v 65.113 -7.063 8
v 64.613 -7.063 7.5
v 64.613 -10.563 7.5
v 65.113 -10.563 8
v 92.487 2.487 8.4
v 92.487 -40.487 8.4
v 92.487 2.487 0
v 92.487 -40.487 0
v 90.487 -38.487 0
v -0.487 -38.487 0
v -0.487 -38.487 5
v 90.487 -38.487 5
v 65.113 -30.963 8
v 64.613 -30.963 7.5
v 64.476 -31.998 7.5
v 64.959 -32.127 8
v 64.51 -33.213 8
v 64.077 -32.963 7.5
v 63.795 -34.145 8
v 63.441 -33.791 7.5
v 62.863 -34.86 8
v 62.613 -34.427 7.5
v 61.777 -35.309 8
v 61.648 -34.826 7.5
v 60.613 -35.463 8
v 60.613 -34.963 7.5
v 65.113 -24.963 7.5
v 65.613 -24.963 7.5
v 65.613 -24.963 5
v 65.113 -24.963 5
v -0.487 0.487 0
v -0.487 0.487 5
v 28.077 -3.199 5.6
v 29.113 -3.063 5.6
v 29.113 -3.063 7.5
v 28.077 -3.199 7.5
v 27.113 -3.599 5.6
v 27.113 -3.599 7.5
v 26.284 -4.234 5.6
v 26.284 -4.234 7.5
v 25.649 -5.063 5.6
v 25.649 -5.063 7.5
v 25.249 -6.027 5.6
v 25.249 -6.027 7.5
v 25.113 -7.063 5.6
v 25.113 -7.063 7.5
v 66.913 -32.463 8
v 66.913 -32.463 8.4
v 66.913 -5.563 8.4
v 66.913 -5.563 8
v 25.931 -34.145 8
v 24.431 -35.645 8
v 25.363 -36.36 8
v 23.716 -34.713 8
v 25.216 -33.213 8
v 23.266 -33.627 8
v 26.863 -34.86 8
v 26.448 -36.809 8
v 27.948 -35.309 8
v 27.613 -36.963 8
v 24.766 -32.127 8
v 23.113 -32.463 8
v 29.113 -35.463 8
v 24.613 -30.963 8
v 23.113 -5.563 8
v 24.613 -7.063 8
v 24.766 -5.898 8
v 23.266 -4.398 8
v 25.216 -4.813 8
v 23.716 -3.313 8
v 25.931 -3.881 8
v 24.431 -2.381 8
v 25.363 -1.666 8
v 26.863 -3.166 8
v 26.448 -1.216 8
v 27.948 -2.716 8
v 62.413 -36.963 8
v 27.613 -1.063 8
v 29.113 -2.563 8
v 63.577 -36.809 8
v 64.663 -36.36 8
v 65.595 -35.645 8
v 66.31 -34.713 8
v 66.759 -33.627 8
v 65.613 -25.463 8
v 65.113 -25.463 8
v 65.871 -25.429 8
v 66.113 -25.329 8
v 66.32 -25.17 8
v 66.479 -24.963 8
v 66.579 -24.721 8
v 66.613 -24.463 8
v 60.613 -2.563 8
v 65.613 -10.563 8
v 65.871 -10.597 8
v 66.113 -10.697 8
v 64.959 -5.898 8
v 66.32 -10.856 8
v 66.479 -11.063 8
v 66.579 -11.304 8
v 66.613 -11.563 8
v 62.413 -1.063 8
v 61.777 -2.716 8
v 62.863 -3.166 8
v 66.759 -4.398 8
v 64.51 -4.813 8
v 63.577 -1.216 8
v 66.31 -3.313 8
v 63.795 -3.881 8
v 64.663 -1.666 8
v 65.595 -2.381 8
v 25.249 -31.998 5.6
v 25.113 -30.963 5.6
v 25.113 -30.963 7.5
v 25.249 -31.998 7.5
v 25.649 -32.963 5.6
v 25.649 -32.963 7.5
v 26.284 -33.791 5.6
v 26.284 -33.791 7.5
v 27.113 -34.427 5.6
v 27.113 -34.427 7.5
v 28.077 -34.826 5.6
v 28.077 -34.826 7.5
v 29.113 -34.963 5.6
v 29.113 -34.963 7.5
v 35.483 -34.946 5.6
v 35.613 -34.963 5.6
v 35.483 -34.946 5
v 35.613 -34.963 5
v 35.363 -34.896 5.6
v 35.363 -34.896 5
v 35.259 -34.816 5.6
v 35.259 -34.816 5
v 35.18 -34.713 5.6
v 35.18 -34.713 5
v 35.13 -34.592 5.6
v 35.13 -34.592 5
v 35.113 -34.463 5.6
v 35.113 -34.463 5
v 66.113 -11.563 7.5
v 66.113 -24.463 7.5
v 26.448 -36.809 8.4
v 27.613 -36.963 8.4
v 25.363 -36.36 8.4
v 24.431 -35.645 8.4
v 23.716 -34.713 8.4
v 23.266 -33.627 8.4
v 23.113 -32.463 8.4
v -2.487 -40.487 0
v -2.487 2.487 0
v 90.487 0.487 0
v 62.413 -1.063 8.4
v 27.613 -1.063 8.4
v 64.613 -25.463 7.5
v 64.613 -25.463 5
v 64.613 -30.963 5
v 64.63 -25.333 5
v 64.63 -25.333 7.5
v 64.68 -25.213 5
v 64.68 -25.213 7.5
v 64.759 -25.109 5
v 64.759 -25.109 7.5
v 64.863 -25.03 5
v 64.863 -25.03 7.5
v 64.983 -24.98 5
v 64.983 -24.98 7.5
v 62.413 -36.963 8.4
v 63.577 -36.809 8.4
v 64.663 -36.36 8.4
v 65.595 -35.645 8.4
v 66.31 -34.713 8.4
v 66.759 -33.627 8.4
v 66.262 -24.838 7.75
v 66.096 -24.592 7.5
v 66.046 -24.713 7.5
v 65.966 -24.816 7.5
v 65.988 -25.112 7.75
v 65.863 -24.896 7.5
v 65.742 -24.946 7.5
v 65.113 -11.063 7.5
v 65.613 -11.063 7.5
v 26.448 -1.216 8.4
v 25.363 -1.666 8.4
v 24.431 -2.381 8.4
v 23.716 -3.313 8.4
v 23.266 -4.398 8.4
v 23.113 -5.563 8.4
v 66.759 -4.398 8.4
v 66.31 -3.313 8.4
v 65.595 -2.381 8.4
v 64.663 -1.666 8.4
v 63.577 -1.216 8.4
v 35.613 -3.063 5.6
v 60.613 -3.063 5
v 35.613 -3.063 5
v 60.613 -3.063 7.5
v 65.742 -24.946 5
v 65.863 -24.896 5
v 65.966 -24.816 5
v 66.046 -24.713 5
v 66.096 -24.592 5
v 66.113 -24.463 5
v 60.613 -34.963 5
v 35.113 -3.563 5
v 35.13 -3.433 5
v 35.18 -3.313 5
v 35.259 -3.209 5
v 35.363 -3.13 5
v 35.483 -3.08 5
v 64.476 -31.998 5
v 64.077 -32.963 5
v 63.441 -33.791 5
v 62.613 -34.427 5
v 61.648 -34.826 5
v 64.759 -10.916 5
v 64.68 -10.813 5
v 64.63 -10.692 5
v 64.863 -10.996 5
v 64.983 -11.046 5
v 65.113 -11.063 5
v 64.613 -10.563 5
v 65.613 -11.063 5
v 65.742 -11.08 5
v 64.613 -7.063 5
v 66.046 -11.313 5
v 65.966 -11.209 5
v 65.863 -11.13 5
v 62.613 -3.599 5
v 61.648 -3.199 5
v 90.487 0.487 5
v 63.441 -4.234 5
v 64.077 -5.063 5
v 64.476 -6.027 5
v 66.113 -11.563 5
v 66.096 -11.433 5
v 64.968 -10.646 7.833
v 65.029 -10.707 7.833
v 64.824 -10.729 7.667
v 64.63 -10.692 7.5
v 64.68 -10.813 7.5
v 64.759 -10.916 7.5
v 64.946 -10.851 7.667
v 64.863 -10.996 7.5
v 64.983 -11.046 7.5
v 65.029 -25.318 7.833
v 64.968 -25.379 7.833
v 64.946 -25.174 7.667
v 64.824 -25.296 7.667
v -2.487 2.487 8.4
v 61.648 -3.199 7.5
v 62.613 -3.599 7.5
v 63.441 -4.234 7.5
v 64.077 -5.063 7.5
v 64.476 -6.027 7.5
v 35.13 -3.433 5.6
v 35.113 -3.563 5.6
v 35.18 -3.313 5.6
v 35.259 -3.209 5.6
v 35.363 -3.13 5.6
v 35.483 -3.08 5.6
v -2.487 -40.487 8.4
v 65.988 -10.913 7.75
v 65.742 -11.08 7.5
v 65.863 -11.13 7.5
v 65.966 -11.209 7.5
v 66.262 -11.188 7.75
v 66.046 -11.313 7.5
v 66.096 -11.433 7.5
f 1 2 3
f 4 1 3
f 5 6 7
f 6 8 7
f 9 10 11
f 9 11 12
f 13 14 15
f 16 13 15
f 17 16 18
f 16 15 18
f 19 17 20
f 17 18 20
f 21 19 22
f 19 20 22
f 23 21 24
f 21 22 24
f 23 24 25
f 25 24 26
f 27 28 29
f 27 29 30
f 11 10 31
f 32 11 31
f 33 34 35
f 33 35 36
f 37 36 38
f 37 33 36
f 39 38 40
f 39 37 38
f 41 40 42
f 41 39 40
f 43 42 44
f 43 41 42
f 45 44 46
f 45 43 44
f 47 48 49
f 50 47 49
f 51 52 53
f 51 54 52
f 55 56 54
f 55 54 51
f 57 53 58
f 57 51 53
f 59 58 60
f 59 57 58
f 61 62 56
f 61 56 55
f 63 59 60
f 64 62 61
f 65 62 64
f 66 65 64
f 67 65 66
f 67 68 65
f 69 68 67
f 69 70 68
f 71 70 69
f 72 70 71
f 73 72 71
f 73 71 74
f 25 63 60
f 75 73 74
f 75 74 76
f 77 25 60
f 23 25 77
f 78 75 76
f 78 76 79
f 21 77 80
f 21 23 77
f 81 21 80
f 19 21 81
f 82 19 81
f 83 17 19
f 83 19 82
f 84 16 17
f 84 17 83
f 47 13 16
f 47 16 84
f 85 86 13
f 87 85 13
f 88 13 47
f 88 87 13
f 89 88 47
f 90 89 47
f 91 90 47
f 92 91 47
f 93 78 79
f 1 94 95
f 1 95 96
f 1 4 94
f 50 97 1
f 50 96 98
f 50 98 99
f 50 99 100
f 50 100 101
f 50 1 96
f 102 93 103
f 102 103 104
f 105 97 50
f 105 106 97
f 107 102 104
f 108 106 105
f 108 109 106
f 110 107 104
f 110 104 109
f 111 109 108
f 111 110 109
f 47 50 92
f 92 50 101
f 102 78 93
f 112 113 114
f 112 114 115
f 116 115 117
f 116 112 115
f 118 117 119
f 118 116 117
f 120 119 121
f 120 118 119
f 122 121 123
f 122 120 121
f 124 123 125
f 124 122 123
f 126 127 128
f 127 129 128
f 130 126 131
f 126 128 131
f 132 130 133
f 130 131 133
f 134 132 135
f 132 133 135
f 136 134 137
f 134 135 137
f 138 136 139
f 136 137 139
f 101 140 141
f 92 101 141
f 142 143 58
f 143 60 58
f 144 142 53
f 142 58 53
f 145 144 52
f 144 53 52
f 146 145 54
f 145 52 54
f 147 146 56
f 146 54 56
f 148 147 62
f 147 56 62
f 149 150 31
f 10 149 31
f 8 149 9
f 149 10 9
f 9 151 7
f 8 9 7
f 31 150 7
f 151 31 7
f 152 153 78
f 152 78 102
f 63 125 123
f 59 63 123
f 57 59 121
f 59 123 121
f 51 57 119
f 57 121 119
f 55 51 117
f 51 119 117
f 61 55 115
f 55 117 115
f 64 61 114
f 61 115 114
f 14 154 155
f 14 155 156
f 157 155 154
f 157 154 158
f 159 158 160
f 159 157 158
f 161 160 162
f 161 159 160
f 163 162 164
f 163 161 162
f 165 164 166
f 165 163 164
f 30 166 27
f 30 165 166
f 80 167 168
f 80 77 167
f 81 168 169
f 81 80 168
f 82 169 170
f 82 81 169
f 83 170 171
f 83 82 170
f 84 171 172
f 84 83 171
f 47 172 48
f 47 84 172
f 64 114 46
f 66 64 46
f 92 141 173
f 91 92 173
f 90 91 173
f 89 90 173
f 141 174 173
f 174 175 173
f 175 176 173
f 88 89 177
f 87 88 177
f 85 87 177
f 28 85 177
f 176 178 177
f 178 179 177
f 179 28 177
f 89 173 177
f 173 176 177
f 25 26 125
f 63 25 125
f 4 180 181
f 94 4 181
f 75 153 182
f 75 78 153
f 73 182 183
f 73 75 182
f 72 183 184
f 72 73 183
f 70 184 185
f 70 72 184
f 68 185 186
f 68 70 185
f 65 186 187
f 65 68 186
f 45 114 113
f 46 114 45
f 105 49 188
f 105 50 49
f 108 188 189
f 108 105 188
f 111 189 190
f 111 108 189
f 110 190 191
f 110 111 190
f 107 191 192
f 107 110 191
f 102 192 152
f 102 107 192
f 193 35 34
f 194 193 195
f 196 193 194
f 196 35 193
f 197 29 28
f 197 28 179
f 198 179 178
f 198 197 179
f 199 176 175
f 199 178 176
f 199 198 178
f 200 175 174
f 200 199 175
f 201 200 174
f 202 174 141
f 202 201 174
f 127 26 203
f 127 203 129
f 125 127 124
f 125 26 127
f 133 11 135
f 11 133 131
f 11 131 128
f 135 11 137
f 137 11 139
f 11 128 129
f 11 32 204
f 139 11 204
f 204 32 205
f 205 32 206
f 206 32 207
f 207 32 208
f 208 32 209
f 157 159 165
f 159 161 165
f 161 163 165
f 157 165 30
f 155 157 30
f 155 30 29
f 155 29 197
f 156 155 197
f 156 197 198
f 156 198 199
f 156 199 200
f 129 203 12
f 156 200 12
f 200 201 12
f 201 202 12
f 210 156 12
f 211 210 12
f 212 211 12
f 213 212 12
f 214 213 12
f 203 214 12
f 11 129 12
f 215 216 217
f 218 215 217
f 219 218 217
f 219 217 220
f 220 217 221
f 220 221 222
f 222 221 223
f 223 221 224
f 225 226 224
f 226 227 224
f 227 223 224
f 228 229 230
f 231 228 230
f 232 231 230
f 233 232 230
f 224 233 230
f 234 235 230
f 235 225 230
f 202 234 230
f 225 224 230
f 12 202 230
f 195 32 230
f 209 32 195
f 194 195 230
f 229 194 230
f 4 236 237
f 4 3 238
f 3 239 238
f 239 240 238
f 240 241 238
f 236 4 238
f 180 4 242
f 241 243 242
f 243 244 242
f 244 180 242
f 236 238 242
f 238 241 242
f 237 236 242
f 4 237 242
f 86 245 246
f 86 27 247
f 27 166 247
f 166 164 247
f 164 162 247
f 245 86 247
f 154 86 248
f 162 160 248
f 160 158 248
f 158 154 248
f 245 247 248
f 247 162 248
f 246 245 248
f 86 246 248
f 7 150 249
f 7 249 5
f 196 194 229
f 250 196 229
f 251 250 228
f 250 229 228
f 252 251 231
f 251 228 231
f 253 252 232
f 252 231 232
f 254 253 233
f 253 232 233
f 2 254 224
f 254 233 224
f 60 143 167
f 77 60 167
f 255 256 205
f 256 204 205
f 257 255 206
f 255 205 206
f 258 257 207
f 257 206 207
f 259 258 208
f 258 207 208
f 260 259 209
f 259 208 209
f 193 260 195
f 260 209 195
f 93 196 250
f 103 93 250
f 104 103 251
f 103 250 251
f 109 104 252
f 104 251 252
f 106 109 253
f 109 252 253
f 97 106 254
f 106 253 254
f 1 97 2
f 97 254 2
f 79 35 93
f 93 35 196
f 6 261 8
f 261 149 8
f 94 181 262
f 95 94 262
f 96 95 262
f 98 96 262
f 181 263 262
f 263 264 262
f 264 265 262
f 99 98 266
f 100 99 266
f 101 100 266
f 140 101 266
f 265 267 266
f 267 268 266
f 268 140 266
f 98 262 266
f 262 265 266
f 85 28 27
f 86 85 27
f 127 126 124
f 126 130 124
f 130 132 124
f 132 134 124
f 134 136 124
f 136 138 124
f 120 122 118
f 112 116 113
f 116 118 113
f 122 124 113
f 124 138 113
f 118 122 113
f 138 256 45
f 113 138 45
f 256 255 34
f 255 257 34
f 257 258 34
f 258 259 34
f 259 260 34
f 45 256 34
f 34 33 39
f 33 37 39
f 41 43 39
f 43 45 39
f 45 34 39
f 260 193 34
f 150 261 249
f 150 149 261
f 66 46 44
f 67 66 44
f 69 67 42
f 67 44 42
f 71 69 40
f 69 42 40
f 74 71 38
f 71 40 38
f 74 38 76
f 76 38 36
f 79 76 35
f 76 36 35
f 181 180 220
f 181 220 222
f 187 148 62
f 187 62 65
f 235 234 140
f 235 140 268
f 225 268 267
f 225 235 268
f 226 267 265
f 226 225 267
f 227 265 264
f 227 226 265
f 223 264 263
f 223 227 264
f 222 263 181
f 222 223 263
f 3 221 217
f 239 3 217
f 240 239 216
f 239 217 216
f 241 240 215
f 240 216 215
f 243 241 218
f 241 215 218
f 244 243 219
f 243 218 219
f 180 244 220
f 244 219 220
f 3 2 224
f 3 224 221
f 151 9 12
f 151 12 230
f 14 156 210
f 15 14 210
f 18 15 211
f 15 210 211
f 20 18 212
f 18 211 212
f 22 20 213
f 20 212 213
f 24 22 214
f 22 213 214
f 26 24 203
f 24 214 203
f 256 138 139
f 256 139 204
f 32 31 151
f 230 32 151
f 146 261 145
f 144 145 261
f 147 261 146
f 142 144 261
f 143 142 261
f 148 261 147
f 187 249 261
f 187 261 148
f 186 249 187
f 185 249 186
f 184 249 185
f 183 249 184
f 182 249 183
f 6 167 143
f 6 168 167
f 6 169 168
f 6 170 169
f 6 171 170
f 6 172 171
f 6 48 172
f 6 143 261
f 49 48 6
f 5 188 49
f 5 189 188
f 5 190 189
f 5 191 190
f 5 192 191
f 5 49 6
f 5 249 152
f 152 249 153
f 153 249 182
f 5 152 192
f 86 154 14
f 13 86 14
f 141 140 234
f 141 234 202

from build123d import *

# Parameters (mm, degrees)
SKETCH_2_W          = 94.97478029
SKETCH_2_H          = 42.97467615
SKETCH_2_W_2        = 90.97478029
SKETCH_2_H_2        = 38.97467615
EXTRUDE_1_DEPTH     = 5
SKETCH_3_W          = 94.97478029
SKETCH_3_H          = 42.97467615
EXTRUDE_2_DEPTH     = 3.4
SKETCH_4_W          = 43.8
SKETCH_4_H          = 35.9
CUT_EXTRUDE_1_DEPTH = 0.4
FILLET_1_R          = 4.5
CUT_EXTRUDE_2_DEPTH = 2.4
CUT_EXTRUDE_3_DEPTH = 0.6
FILLET_2_R          = 4
FILLET_3_R          = 0.5
CHAMFER_1_SIZE      = 0.5


with BuildPart() as part:
    # 草图2 → 凸台-拉伸1 (new body)
    with BuildSketch(Plane.XY):
        with Locations((45.00009017, -19.0000381)):
            Rectangle(SKETCH_2_W, SKETCH_2_H)
        with Locations((45.00009017, -19.0000381)):
            Rectangle(SKETCH_2_W_2, SKETCH_2_H_2, mode=Mode.SUBTRACT)
    extrude(amount=EXTRUDE_1_DEPTH)

    # 草图3 → 凸台-拉伸2 (add)
    with BuildSketch(Plane.XY.offset(5)):
        with Locations((45.00009017, -19.0000381)):
            Rectangle(SKETCH_3_W, SKETCH_3_H)
    extrude(amount=EXTRUDE_2_DEPTH)

    # 草图4 → 切除-拉伸1 (cut)
    with BuildSketch(Plane.XY.offset(8.4)):
        with Locations((45.012700025, -19.012700025)):
            Rectangle(SKETCH_4_W, SKETCH_4_H)
    extrude(amount=-CUT_EXTRUDE_1_DEPTH, mode=Mode.SUBTRACT)

    # 圆角1
    fillet_1_edges = [part.edges().sort_by_distance(p)[0] for p in [
        (23.112700025, -36.962700025, 8.2),
        (23.112700025, -1.062700025, 8.2),
        (66.912700025, -1.062700025, 8.2),
        (66.912700025, -36.962700025, 8.2),
    ]]
    fillet(fillet_1_edges, radius=FILLET_1_R)

    # 草图5 → 切除-拉伸2 (cut)
    with BuildSketch(Plane.XY.offset(8)):
        Polygon((25.112700025, -3.062700025), (64.612700025, -3.062700025), (64.612700025, -11.062700025), (66.112700025, -11.062700025), (66.112700025, -24.962700025), (64.612700025, -24.962700025), (64.612700025, -34.962700025), (25.112700025, -34.962700025), align=None)
    extrude(amount=-CUT_EXTRUDE_2_DEPTH, mode=Mode.SUBTRACT)

    # 草图6 → 切除-拉伸3 (cut)
    with BuildSketch(Plane.XY.offset(5.6)):
        Polygon((35.112700025, -3.062700025), (64.612700025, -3.062700025), (64.612700025, -11.062700025), (66.112700025, -11.062700025), (66.112700025, -24.962700025), (64.612700025, -24.962700025), (64.612700025, -34.962700025), (35.112700025, -34.962700025), align=None)
    extrude(amount=-CUT_EXTRUDE_3_DEPTH, mode=Mode.SUBTRACT)

    # 圆角2
    fillet_2_edges = [part.edges().sort_by_distance(p)[0] for p in [
        (25.112700025, -34.962700025, 6.8),
        (25.112700025, -3.062700025, 6.8),
        (64.612700025, -3.062700025, 6.5),
        (64.612700025, -34.962700025, 6.5),
    ]]
    fillet(fillet_2_edges, radius=FILLET_2_R)

    # 圆角3
    fillet_3_edges = [part.edges().sort_by_distance(p)[0] for p in [
        (35.112700025, -34.962700025, 5.3),
        (35.112700025, -3.062700025, 5.3),
        (64.612700025, -11.062700025, 6.5),
        (66.112700025, -11.062700025, 6.5),
        (66.112700025, -24.962700025, 6.5),
        (64.612700025, -24.962700025, 6.5),
    ]]
    fillet(fillet_3_edges, radius=FILLET_3_R)

    # 倒角1
    chamfer_1_edges = [part.edges().sort_by_distance(p)[0] for p in [
        (64.612700025, -28.212700025, 8),
        (44.862700025, -34.962700025, 8),
        (25.112700025, -19.012700025, 8),
        (44.862700025, -3.062700025, 8),
        (63.44112715, -33.79112715, 8),
        (26.284272901, -33.79112715, 8),
        (63.44112715, -4.234272901, 8),
        (26.284272901, -4.234272901, 8),
        (66.112700025, -18.012700025, 8),
        (65.362700025, -24.962700025, 8),
        (65.362700025, -11.062700025, 8),
        (64.612700025, -8.812700025, 8),
        (64.759146635, -25.109146635, 8),
        (64.759146635, -10.916253416, 8),
        (65.966253416, -24.816253416, 8),
        (65.966253416, -11.209146635, 8),
    ]]
    chamfer(chamfer_1_edges, length=CHAMFER_1_SIZE - 0.0001)  # a hair under: the kernel refuses the full size


solid = part.part
